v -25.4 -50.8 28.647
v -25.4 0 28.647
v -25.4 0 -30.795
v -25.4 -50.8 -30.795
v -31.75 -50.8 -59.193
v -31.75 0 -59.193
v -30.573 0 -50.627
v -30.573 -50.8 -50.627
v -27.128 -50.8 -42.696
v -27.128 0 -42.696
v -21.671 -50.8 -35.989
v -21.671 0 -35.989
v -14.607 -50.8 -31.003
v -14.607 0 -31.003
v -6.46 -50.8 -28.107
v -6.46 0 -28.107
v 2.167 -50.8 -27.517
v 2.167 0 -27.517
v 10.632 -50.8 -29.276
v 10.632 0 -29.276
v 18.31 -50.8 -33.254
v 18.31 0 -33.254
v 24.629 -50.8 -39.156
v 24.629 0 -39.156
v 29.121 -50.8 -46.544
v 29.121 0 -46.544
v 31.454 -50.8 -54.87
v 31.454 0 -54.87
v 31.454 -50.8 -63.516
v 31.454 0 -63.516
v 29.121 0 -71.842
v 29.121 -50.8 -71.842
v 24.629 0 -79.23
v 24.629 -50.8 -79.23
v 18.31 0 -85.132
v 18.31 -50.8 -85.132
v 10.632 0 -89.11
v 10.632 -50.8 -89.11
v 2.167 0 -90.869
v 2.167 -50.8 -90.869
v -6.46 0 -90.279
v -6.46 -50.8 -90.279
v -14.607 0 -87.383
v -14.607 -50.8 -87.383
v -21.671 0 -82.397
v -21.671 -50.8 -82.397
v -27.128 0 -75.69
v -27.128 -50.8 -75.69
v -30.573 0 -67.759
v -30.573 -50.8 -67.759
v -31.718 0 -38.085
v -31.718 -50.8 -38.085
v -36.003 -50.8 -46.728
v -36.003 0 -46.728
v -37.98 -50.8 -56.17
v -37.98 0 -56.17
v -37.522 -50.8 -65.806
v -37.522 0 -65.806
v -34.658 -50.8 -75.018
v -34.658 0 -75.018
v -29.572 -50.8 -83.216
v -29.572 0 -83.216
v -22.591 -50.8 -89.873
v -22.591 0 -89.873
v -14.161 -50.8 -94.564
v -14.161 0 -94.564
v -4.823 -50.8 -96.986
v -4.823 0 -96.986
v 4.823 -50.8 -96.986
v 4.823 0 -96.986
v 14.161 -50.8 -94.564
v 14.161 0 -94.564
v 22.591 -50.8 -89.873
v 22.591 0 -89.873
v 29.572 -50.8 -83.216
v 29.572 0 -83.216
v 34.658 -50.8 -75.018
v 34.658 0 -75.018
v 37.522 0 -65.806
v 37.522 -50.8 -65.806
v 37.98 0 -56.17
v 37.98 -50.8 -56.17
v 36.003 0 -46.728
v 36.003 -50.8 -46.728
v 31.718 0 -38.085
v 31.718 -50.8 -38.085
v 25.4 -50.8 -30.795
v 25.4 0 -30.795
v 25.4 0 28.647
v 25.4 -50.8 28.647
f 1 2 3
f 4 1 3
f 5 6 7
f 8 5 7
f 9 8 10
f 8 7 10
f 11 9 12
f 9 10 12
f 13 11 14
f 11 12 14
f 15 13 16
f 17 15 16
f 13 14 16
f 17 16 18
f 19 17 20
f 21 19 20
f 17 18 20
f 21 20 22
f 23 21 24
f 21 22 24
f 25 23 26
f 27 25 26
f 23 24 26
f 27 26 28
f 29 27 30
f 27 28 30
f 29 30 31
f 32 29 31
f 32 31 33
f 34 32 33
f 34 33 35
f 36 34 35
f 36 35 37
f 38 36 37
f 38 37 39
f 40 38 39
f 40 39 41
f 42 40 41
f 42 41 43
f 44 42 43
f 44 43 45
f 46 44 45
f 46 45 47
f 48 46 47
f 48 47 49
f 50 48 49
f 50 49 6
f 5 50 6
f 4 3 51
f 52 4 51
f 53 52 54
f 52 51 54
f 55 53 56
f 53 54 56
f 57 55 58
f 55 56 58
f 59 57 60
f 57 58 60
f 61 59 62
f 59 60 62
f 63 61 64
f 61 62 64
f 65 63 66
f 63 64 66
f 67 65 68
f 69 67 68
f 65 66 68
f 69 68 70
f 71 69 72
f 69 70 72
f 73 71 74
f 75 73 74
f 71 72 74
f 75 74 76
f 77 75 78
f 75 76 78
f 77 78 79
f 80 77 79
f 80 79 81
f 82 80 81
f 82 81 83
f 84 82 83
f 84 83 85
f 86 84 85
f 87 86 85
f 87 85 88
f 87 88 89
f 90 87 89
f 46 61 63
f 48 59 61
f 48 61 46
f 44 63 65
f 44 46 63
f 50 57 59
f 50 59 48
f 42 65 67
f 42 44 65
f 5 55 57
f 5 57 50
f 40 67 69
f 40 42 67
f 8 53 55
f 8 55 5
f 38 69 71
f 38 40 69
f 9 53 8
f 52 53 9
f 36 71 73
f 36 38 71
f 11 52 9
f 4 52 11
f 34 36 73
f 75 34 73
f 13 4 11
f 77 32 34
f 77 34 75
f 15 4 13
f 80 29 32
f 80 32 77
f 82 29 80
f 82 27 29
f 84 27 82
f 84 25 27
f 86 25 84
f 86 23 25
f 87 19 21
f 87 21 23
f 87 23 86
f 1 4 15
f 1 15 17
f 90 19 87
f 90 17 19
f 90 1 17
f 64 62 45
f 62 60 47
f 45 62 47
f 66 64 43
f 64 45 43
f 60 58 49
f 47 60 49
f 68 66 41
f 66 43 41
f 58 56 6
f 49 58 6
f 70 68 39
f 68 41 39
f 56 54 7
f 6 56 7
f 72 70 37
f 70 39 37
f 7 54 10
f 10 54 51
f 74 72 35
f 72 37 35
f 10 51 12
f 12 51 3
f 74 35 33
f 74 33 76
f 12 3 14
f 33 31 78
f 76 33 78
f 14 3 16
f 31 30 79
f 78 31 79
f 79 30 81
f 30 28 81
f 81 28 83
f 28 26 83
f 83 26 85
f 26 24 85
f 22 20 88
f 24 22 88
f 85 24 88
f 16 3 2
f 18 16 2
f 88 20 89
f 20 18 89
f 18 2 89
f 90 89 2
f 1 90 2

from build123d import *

# Parameters (mm, degrees)
F1_DEPTH = 50.8
F3_D     = 63.5


with BuildPart() as f1:
    # F0 (on Front) → F1 (new body)
    with BuildSketch(Plane.XZ):
        with BuildLine():
            ThreePointArc((-25.4, -30.7949761419), (-15.5542598667, -93.9734218577), (38.1, -59.1930394562))
            ThreePointArc((38.1, -59.1930394562), (34.7803824016, -43.6387795895), (25.4, -30.7949761419))
            Line((25.4, -30.7949761419), (25.4, -47.553297191))
            Line((25.4, -47.553297191), (-25.4, -47.553297191))
            Line((-25.4, -47.553297191), (-25.4, -30.7949761419))
        make_face()
        with BuildLine():
            Line((25.4, -47.553297191), (25.4, -30.7949761419))
            ThreePointArc((25.4, -30.7949761419), (0, -21.0930394562), (-25.4, -30.7949761419))
            Line((-25.4, -30.7949761419), (-25.4, -47.553297191))
            Line((-25.4, -47.553297191), (25.4, -47.553297191))
        make_face()
        with BuildLine():
            ThreePointArc((-25.4, -30.7949761419), (0, -21.0930394562), (25.4, -30.7949761419))
            Line((25.4, -30.7949761419), (25.4, 28.646702809))
            Line((25.4, 28.646702809), (-25.4, 28.646702809))
            Line((-25.4, 28.646702809), (-25.4, -30.7949761419))
        make_face()
    extrude(amount=F1_DEPTH)

    # F3 (through all)
    with Locations(Plane.XZ.offset(50.8)):
        with Locations((0, -59.1930394562)):
            Hole(F3_D / 2)


solid = f1.part
